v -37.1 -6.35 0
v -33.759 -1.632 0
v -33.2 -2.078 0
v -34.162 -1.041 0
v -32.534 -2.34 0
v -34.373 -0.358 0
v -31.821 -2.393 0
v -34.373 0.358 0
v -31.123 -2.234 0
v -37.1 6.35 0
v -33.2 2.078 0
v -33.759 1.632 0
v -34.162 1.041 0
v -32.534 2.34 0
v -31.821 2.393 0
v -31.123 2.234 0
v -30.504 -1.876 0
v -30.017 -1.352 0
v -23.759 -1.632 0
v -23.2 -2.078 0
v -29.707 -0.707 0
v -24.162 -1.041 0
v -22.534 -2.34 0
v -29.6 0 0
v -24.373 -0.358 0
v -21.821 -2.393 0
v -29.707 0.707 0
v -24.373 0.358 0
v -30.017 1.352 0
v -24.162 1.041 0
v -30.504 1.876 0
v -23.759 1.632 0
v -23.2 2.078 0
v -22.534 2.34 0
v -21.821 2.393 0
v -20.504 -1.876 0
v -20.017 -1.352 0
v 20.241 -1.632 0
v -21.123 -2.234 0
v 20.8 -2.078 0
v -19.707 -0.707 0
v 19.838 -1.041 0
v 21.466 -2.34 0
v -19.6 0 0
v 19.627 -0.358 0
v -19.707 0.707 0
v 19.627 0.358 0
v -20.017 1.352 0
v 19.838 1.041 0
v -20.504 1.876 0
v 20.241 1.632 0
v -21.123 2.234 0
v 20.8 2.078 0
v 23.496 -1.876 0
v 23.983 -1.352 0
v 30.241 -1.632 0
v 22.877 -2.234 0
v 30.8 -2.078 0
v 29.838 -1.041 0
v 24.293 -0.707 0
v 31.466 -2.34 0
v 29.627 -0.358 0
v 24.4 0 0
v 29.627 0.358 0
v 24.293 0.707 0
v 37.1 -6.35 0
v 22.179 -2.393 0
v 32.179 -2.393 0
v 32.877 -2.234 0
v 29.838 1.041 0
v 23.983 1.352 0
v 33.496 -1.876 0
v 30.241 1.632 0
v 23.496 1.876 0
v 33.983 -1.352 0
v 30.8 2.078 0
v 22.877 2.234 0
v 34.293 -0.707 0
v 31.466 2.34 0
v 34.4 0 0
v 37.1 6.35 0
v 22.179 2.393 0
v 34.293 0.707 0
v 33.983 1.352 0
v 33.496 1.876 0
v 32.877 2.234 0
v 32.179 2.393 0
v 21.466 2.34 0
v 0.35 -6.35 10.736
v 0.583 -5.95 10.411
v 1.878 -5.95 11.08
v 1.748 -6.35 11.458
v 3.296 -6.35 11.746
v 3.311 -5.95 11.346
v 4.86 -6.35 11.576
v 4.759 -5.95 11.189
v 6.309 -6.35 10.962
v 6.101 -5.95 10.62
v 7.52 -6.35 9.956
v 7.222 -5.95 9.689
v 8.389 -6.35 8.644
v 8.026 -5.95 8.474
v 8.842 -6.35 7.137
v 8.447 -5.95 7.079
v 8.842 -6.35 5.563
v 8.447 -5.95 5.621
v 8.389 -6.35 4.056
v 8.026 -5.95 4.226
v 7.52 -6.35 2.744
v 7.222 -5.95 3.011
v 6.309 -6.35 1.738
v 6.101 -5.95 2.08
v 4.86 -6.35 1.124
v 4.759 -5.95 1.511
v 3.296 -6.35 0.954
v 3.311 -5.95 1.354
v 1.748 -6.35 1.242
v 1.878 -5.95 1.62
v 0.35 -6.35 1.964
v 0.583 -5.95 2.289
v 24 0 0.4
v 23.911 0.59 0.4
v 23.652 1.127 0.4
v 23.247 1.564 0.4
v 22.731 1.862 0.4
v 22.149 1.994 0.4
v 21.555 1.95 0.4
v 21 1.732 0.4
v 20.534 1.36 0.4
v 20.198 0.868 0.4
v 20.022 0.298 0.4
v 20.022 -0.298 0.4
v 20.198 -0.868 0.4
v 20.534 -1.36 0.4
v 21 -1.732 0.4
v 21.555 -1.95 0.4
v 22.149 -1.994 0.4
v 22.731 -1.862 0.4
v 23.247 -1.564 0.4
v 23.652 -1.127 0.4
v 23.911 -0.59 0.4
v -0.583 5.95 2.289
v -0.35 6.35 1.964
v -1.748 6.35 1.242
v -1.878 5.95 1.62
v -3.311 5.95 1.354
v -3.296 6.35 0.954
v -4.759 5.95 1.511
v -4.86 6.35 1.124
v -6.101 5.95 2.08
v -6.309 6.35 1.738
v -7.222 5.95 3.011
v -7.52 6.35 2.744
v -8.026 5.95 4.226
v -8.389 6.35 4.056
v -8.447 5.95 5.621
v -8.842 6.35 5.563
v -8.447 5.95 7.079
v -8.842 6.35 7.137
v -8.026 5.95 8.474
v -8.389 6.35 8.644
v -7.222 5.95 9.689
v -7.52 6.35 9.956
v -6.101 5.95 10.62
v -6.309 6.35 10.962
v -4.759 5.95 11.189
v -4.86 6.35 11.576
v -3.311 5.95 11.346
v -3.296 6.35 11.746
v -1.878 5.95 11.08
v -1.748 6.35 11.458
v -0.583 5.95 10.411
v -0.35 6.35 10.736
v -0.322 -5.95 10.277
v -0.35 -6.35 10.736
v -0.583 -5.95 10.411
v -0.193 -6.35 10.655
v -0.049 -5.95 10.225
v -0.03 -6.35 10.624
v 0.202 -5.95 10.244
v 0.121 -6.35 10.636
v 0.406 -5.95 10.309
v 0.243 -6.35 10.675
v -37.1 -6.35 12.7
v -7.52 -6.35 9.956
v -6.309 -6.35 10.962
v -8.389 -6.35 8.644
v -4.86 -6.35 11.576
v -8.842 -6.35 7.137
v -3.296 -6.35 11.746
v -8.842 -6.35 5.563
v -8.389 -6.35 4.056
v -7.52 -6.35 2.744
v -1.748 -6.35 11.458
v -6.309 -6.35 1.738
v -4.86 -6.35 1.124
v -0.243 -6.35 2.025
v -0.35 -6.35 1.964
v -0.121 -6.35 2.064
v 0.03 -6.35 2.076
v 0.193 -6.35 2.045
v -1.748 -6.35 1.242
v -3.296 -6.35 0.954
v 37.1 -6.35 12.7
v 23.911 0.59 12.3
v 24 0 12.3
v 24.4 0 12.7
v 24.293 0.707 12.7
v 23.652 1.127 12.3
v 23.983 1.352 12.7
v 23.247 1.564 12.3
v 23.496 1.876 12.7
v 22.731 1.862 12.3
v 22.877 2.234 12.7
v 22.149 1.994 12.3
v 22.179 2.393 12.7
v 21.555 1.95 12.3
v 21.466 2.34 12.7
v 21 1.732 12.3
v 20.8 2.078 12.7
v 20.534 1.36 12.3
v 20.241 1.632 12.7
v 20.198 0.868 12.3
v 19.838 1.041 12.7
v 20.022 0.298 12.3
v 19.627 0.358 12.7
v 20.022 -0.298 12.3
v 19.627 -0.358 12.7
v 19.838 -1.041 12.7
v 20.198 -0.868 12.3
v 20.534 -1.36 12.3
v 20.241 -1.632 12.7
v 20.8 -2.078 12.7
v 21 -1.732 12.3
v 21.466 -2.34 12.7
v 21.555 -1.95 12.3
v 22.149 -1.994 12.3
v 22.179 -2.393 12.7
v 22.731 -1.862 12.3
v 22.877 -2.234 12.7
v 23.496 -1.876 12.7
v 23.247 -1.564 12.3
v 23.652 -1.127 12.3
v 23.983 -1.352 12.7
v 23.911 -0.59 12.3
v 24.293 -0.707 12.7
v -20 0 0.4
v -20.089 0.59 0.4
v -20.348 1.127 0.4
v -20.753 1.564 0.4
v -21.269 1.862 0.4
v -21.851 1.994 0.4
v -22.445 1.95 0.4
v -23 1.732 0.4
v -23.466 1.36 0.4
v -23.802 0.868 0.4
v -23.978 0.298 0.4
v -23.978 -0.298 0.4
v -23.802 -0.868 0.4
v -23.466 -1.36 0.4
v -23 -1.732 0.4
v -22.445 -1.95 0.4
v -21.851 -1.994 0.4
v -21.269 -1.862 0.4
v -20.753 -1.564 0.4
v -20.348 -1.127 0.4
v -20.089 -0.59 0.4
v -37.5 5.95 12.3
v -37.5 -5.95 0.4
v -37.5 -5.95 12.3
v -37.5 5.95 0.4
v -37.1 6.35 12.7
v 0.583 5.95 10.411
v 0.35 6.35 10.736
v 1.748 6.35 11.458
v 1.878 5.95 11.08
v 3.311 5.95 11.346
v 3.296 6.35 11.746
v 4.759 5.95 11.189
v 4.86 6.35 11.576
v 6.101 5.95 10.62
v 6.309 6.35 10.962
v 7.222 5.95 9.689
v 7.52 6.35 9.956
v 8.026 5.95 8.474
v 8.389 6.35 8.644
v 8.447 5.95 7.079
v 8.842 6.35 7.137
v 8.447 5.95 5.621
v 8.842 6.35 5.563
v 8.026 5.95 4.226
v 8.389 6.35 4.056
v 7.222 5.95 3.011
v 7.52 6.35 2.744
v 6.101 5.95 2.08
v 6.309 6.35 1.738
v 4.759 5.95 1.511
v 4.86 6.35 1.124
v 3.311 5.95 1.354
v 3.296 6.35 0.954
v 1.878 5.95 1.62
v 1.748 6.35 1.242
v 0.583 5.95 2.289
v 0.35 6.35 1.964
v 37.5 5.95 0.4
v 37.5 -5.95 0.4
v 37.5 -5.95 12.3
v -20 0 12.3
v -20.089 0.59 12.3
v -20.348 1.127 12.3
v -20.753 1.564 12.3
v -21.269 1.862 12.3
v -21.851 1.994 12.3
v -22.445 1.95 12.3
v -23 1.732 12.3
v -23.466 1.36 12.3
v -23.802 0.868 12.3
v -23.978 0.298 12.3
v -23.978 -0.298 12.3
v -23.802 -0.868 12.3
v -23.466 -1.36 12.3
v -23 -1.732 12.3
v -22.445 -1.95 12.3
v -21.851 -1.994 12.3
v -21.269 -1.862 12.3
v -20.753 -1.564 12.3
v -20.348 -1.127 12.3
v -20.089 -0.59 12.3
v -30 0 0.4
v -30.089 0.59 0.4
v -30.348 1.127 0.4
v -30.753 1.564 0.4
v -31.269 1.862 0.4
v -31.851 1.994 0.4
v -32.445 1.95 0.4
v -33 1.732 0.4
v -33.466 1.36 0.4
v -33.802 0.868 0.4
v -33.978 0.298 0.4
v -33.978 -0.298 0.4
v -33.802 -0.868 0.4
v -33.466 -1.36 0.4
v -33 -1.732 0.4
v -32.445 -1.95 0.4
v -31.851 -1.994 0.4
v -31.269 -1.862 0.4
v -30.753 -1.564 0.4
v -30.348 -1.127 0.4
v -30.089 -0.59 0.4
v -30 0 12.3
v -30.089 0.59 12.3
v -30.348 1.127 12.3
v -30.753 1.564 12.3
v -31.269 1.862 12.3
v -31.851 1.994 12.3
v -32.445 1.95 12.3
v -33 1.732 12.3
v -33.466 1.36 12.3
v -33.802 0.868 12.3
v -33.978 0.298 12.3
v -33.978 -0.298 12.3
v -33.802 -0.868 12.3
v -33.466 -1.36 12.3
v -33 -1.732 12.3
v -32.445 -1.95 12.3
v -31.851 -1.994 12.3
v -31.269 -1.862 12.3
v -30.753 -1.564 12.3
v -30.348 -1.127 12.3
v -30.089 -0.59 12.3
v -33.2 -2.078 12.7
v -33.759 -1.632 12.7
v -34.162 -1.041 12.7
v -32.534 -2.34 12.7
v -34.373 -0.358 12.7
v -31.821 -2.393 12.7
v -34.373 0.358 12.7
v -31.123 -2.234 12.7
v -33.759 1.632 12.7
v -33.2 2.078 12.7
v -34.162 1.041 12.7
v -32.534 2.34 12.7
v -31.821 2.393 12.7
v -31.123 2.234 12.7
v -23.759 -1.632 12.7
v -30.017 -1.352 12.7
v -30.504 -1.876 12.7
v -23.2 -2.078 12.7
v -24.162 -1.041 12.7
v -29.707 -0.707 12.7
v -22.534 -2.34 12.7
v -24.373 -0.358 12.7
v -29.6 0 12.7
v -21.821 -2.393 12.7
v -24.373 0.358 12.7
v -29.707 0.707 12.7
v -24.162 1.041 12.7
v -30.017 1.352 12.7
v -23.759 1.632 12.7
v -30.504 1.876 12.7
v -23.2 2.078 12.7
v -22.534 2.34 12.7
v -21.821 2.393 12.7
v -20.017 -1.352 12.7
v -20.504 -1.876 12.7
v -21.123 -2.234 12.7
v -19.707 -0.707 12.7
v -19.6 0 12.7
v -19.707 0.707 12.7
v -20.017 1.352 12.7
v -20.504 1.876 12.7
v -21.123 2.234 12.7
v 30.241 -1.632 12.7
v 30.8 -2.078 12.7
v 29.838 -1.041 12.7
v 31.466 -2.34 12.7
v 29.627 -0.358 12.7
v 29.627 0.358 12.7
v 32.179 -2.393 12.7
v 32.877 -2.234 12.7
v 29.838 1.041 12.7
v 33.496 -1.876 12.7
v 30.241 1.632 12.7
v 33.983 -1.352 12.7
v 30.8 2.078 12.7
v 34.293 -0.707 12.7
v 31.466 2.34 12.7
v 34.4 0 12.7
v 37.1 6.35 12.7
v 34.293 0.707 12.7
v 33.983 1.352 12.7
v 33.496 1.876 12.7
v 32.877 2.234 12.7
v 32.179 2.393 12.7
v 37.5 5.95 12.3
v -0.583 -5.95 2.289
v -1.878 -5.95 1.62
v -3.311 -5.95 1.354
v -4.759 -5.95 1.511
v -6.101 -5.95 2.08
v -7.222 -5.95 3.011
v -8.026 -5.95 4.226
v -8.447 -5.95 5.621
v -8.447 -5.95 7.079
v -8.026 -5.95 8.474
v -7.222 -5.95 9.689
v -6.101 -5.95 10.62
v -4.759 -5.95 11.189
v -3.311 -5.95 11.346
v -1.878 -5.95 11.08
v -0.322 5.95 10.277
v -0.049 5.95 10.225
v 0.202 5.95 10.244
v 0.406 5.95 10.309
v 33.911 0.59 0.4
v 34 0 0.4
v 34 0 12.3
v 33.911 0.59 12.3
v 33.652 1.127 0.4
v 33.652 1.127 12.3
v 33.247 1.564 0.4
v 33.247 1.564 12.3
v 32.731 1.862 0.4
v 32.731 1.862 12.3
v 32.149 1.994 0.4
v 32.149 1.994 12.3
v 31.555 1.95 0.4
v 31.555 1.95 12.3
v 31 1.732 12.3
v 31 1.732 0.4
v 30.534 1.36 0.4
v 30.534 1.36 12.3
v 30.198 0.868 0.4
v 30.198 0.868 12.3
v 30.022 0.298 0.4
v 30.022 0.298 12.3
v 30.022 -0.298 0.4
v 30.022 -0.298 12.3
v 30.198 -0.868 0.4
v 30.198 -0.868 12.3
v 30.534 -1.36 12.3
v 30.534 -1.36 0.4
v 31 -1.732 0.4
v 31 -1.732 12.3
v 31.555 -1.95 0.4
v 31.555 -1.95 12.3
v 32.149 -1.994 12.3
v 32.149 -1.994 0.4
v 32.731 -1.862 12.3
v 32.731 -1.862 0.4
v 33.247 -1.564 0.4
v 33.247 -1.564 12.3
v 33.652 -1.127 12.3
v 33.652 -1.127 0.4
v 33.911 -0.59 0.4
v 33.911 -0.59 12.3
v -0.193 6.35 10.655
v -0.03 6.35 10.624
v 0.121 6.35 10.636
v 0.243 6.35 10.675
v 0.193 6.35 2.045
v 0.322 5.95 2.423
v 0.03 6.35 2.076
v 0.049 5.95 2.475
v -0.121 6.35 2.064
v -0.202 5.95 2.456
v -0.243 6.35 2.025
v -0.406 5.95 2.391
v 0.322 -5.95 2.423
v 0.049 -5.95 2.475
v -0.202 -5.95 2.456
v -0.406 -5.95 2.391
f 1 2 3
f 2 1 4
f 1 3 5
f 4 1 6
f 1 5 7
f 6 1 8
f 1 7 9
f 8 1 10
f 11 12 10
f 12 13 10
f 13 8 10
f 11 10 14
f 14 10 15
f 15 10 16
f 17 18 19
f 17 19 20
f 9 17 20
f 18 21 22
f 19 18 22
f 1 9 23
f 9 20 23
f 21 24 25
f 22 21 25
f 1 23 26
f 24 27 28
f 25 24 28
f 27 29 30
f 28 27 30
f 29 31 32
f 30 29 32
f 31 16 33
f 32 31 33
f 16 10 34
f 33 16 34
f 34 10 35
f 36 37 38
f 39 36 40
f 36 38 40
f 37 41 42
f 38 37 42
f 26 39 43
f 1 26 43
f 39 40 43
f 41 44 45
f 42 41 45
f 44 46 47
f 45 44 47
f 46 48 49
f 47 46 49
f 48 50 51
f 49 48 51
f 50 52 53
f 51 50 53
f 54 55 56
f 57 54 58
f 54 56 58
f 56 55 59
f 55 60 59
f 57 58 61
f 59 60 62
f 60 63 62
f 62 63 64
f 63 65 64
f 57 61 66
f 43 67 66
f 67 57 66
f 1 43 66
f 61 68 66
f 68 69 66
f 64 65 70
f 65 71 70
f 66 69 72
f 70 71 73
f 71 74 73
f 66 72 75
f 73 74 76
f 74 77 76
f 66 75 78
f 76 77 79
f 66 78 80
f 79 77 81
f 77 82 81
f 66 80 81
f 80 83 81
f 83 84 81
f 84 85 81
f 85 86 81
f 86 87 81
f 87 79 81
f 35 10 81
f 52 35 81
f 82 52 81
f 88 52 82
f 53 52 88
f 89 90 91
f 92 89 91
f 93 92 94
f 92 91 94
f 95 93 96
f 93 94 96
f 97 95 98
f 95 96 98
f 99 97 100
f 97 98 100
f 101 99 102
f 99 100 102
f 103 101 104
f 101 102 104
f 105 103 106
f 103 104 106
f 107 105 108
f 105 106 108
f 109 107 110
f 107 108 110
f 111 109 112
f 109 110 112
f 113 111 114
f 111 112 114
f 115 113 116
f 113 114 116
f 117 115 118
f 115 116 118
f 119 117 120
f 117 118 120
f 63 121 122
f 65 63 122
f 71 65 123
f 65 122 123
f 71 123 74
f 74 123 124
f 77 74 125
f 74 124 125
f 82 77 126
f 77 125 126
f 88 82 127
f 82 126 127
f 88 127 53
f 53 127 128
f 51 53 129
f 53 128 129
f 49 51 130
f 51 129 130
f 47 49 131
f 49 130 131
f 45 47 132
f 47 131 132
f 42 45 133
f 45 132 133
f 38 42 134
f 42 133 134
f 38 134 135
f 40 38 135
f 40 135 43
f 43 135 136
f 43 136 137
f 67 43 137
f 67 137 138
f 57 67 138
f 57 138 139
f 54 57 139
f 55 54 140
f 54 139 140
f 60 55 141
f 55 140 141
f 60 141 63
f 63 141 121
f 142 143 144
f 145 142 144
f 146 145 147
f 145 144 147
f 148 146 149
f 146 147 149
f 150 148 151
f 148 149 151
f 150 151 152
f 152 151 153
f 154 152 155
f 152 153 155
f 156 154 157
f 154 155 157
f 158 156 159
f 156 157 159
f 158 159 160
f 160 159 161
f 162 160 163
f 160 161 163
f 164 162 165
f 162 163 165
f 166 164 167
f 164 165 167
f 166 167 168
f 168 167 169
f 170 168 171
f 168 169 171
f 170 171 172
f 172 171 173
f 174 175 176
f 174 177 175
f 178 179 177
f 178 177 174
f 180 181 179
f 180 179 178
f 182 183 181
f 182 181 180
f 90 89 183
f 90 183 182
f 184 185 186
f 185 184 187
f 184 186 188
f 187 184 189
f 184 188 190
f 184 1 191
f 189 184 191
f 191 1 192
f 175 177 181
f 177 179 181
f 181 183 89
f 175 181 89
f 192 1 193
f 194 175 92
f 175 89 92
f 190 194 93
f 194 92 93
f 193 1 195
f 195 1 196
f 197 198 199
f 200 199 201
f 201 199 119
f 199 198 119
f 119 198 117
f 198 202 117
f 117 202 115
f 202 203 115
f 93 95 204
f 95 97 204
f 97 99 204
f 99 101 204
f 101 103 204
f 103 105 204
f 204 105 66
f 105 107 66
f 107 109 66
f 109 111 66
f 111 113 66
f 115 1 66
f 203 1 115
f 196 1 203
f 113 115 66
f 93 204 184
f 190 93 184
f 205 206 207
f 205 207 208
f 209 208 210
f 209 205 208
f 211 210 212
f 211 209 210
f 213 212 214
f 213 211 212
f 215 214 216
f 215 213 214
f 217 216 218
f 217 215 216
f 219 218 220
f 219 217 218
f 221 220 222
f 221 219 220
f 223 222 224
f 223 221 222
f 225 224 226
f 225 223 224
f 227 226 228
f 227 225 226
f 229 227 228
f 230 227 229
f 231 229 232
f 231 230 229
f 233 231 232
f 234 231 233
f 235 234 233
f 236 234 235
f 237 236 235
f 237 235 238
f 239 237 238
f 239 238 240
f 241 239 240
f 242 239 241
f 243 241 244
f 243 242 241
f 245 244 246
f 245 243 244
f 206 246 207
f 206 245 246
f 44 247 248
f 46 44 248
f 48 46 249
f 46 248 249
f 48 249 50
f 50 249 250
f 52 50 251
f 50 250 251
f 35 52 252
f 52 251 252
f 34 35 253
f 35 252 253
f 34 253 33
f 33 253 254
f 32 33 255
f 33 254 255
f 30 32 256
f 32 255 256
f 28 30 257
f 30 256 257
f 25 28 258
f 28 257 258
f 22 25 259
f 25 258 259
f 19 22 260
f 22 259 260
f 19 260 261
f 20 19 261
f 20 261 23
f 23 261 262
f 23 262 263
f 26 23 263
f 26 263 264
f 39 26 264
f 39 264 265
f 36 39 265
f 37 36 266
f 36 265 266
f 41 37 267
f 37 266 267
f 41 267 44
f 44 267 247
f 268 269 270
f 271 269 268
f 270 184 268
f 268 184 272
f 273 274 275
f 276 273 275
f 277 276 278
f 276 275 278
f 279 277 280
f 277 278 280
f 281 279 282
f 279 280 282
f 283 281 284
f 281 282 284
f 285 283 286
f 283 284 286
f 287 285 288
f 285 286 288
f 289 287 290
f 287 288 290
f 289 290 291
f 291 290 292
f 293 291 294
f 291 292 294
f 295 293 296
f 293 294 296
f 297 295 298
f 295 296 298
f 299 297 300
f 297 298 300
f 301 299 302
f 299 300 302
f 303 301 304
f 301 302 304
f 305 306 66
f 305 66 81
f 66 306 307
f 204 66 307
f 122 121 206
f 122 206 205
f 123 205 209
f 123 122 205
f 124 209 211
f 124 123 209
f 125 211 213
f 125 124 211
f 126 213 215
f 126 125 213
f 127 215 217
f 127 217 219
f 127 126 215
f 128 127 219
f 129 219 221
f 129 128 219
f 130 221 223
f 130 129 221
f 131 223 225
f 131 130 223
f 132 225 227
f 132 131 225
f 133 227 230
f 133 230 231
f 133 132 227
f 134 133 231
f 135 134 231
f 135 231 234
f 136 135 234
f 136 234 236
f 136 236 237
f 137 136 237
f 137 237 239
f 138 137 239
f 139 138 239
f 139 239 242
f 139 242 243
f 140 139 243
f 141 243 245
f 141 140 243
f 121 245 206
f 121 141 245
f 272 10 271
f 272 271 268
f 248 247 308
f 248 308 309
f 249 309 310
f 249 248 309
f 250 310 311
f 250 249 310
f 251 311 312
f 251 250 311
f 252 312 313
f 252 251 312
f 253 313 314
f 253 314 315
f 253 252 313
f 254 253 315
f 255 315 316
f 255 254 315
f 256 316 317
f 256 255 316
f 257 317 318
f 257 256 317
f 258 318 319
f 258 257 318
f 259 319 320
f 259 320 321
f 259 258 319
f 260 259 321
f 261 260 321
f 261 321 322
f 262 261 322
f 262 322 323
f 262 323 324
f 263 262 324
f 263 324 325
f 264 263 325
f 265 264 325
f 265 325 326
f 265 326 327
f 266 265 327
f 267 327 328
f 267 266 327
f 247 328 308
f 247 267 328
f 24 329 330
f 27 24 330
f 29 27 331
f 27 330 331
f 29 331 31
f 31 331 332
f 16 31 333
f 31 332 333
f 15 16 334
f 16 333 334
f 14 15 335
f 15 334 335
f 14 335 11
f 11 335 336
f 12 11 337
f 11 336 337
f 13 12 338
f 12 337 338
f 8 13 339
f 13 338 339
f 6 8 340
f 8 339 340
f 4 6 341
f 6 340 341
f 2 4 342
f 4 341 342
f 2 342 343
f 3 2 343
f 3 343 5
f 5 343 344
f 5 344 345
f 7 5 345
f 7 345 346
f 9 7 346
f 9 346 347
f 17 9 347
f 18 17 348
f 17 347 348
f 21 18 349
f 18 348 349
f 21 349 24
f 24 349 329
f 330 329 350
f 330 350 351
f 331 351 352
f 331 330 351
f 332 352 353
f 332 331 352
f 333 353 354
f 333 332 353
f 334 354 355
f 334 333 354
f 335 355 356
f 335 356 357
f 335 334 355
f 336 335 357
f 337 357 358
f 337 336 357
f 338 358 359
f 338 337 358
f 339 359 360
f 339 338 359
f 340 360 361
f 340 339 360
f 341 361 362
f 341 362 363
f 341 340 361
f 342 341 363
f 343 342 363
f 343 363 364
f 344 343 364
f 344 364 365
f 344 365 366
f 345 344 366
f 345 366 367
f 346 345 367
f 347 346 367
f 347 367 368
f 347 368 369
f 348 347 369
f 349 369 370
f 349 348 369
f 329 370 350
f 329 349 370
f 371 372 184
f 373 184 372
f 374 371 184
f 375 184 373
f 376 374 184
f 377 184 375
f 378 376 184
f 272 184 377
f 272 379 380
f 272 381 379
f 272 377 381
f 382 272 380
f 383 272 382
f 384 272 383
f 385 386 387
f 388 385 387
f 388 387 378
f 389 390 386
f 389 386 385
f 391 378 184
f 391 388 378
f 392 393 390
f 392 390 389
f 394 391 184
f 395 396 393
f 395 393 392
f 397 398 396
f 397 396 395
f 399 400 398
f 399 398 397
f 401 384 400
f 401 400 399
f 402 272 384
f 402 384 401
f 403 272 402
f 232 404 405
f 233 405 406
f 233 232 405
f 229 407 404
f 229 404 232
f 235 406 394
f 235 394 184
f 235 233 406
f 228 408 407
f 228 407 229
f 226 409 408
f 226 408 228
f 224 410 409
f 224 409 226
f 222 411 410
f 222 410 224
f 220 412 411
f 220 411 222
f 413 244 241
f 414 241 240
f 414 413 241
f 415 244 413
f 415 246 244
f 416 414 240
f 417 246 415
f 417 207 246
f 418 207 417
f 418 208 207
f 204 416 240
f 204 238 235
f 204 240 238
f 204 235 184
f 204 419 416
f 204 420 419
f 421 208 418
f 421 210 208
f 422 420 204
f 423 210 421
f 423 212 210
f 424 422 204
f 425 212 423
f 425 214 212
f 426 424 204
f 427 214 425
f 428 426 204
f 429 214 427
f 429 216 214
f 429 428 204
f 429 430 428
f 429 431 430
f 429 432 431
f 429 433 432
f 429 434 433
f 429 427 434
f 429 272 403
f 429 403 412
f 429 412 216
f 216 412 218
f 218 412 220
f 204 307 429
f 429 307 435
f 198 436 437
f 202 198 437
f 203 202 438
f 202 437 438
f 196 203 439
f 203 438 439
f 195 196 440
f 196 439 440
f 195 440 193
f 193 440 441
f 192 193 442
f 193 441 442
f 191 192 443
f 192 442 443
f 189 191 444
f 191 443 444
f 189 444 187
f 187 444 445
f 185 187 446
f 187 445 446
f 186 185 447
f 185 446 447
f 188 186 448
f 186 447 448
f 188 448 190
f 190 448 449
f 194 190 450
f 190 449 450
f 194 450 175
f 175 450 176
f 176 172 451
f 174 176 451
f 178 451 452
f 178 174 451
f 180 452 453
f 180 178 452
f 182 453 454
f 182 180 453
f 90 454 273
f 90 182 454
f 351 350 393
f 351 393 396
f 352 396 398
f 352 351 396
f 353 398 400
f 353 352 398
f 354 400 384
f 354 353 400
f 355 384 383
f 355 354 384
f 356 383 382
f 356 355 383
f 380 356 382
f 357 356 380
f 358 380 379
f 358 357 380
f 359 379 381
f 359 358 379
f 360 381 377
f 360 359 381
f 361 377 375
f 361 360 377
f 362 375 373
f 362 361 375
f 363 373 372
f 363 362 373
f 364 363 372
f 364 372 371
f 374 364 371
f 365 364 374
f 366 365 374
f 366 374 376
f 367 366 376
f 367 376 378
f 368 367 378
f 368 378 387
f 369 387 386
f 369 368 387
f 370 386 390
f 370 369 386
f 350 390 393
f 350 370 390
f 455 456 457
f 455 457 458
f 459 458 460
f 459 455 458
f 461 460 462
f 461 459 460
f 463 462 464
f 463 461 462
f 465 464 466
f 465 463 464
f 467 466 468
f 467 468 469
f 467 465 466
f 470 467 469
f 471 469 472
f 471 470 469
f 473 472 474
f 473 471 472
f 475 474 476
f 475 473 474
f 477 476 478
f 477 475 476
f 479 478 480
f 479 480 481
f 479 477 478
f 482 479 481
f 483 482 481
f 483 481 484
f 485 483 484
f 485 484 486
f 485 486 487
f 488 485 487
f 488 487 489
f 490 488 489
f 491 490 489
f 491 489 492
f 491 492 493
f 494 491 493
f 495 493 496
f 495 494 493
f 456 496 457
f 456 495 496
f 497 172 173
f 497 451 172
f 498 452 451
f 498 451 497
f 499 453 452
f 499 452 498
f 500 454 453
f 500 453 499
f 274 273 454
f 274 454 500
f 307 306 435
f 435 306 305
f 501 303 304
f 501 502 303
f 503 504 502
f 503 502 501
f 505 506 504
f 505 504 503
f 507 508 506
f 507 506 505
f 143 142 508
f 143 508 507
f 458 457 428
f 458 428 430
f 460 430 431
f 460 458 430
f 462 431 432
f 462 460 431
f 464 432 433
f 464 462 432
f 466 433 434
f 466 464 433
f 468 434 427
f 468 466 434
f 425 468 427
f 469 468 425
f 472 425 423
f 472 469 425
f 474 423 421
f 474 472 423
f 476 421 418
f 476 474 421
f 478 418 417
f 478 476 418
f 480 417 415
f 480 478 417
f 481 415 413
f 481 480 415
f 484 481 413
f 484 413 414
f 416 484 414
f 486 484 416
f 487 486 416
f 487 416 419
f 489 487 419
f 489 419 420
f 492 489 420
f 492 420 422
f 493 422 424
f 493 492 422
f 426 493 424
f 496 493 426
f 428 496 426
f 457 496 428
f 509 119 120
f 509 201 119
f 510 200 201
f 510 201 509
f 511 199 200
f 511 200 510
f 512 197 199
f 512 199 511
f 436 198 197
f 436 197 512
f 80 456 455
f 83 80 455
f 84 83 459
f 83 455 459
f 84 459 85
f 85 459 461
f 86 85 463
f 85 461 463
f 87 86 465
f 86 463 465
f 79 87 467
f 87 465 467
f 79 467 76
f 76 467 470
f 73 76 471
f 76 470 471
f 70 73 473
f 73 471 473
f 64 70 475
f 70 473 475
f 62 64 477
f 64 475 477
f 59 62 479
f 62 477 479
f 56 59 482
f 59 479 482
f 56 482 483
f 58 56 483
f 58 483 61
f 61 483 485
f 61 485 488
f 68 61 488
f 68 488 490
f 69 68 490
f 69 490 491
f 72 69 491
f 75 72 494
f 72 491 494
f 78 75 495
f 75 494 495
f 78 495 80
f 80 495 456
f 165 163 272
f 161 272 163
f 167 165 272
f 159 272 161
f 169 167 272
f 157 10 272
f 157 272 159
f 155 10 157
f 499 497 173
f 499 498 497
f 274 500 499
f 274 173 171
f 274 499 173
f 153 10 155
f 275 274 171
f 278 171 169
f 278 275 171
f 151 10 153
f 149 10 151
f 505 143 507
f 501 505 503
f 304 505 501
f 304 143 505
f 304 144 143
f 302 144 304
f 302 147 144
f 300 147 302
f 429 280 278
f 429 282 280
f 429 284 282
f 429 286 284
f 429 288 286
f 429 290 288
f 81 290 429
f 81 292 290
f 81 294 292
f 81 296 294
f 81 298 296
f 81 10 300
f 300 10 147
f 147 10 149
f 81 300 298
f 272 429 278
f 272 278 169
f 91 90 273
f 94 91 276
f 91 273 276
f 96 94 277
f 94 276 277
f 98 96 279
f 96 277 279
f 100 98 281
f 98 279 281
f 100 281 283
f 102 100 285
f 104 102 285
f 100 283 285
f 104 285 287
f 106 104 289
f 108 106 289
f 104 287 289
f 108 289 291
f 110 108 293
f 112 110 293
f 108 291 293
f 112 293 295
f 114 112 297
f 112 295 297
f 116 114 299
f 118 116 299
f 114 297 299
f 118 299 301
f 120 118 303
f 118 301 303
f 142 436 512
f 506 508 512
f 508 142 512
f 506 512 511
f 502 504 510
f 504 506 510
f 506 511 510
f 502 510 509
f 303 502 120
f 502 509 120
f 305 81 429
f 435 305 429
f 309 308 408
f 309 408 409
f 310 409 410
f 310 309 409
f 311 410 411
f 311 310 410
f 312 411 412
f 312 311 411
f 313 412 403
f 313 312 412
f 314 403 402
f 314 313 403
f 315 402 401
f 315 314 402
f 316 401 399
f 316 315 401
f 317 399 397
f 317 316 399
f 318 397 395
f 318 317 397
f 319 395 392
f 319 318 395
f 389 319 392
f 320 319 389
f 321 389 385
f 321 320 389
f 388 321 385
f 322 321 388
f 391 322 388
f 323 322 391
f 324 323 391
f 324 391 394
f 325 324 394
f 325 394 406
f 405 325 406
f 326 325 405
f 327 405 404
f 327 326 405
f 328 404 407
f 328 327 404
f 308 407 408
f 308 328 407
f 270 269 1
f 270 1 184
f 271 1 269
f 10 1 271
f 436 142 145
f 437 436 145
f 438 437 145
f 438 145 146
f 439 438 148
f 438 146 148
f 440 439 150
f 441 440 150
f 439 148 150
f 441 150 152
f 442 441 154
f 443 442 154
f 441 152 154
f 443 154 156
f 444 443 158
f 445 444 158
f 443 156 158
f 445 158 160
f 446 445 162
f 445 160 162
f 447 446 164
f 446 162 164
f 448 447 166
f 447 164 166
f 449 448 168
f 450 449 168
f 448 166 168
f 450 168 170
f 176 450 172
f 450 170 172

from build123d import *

# Parameters (mm, degrees)
SKETCH1_W           = 75
SKETCH1_H           = 12.7
SKETCH1_R           = 2
BOSS_EXTRUDE1_DEPTH = 12.7
CUT_EXTRUDE1_REACH  = 43.579
FILLET1_R           = 1
CHAMFER1_SIZE       = 0.4


with BuildPart() as part:
    # Sketch1 → Boss-Extrude1 (new body)
    with BuildSketch(Plane.XY):
        Rectangle(SKETCH1_W, SKETCH1_H)
        with Locations((-32, 0)):
            Circle(SKETCH1_R, mode=Mode.SUBTRACT)
        with Locations((-22, 0)):
            Circle(SKETCH1_R, mode=Mode.SUBTRACT)
        with Locations((22, 0)):
            Circle(SKETCH1_R, mode=Mode.SUBTRACT)
        with Locations((32, 0)):
            Circle(SKETCH1_R, mode=Mode.SUBTRACT)
    extrude(amount=BOSS_EXTRUDE1_DEPTH)

    # Sketch2 → Cut-Extrude1 (cut, up to next)
    with BuildSketch(Plane(origin=(0, 6.35, 0), x_dir=(1, 0, 0), z_dir=(0, 1, 0)), mode=Mode.PRIVATE) as cut_extrude1_sk1:
        with BuildLine():
            ThreePointArc((0, -2.779285786), (-8.5, -6.35), (0, -9.920714214))
            ThreePointArc((0, -9.920714214), (8.5, -6.35), (0, -2.779285786))
        make_face()
    cut_extrude1_tool1 = extrude(cut_extrude1_sk1.sketch, amount=-CUT_EXTRUDE1_REACH, mode=Mode.PRIVATE) & part.part
    add(cut_extrude1_tool1.solids().sort_by_distance((0, 6.35, 6.35))[0], mode=Mode.SUBTRACT)

    # Fillet1
    fillet1_edges = [part.edges().sort_by_distance(p)[0] for p in [
        (0, 0, 9.920714214),
        (0, 0, 2.779285786),
    ]]
    fillet(fillet1_edges, radius=FILLET1_R)

    # Chamfer1
    chamfer1_edges = [part.edges().sort_by_distance(p)[0] for p in [
        (8.5, -6.35, 6.35),
        (0, -6.35, 10.223397172),
        (0, -6.35, 2.476602828),
        (-8.5, -6.35, 6.35),
        (8.5, 6.35, 6.35),
        (0, 6.35, 2.476602828),
        (0, 6.35, 10.223397172),
        (-8.5, 6.35, 6.35),
        (-37.5, 6.35, 6.35),
        (-37.5, 0, 12.7),
        (-37.5, -6.35, 6.35),
        (-37.5, 0, 0),
        (37.5, -6.35, 6.35),
        (37.5, 0, 12.7),
        (37.5, 6.35, 6.35),
        (37.5, 0, 0),
        (30, 0, 0),
        (30, 0, 12.7),
        (20, 0, 0),
        (20, 0, 12.7),
        (-24, 0, 0),
        (-24, 0, 12.7),
        (-34, 0, 0),
        (-34, 0, 12.7),
    ]]
    chamfer(chamfer1_edges, length=CHAMFER1_SIZE)


solid = part.part
